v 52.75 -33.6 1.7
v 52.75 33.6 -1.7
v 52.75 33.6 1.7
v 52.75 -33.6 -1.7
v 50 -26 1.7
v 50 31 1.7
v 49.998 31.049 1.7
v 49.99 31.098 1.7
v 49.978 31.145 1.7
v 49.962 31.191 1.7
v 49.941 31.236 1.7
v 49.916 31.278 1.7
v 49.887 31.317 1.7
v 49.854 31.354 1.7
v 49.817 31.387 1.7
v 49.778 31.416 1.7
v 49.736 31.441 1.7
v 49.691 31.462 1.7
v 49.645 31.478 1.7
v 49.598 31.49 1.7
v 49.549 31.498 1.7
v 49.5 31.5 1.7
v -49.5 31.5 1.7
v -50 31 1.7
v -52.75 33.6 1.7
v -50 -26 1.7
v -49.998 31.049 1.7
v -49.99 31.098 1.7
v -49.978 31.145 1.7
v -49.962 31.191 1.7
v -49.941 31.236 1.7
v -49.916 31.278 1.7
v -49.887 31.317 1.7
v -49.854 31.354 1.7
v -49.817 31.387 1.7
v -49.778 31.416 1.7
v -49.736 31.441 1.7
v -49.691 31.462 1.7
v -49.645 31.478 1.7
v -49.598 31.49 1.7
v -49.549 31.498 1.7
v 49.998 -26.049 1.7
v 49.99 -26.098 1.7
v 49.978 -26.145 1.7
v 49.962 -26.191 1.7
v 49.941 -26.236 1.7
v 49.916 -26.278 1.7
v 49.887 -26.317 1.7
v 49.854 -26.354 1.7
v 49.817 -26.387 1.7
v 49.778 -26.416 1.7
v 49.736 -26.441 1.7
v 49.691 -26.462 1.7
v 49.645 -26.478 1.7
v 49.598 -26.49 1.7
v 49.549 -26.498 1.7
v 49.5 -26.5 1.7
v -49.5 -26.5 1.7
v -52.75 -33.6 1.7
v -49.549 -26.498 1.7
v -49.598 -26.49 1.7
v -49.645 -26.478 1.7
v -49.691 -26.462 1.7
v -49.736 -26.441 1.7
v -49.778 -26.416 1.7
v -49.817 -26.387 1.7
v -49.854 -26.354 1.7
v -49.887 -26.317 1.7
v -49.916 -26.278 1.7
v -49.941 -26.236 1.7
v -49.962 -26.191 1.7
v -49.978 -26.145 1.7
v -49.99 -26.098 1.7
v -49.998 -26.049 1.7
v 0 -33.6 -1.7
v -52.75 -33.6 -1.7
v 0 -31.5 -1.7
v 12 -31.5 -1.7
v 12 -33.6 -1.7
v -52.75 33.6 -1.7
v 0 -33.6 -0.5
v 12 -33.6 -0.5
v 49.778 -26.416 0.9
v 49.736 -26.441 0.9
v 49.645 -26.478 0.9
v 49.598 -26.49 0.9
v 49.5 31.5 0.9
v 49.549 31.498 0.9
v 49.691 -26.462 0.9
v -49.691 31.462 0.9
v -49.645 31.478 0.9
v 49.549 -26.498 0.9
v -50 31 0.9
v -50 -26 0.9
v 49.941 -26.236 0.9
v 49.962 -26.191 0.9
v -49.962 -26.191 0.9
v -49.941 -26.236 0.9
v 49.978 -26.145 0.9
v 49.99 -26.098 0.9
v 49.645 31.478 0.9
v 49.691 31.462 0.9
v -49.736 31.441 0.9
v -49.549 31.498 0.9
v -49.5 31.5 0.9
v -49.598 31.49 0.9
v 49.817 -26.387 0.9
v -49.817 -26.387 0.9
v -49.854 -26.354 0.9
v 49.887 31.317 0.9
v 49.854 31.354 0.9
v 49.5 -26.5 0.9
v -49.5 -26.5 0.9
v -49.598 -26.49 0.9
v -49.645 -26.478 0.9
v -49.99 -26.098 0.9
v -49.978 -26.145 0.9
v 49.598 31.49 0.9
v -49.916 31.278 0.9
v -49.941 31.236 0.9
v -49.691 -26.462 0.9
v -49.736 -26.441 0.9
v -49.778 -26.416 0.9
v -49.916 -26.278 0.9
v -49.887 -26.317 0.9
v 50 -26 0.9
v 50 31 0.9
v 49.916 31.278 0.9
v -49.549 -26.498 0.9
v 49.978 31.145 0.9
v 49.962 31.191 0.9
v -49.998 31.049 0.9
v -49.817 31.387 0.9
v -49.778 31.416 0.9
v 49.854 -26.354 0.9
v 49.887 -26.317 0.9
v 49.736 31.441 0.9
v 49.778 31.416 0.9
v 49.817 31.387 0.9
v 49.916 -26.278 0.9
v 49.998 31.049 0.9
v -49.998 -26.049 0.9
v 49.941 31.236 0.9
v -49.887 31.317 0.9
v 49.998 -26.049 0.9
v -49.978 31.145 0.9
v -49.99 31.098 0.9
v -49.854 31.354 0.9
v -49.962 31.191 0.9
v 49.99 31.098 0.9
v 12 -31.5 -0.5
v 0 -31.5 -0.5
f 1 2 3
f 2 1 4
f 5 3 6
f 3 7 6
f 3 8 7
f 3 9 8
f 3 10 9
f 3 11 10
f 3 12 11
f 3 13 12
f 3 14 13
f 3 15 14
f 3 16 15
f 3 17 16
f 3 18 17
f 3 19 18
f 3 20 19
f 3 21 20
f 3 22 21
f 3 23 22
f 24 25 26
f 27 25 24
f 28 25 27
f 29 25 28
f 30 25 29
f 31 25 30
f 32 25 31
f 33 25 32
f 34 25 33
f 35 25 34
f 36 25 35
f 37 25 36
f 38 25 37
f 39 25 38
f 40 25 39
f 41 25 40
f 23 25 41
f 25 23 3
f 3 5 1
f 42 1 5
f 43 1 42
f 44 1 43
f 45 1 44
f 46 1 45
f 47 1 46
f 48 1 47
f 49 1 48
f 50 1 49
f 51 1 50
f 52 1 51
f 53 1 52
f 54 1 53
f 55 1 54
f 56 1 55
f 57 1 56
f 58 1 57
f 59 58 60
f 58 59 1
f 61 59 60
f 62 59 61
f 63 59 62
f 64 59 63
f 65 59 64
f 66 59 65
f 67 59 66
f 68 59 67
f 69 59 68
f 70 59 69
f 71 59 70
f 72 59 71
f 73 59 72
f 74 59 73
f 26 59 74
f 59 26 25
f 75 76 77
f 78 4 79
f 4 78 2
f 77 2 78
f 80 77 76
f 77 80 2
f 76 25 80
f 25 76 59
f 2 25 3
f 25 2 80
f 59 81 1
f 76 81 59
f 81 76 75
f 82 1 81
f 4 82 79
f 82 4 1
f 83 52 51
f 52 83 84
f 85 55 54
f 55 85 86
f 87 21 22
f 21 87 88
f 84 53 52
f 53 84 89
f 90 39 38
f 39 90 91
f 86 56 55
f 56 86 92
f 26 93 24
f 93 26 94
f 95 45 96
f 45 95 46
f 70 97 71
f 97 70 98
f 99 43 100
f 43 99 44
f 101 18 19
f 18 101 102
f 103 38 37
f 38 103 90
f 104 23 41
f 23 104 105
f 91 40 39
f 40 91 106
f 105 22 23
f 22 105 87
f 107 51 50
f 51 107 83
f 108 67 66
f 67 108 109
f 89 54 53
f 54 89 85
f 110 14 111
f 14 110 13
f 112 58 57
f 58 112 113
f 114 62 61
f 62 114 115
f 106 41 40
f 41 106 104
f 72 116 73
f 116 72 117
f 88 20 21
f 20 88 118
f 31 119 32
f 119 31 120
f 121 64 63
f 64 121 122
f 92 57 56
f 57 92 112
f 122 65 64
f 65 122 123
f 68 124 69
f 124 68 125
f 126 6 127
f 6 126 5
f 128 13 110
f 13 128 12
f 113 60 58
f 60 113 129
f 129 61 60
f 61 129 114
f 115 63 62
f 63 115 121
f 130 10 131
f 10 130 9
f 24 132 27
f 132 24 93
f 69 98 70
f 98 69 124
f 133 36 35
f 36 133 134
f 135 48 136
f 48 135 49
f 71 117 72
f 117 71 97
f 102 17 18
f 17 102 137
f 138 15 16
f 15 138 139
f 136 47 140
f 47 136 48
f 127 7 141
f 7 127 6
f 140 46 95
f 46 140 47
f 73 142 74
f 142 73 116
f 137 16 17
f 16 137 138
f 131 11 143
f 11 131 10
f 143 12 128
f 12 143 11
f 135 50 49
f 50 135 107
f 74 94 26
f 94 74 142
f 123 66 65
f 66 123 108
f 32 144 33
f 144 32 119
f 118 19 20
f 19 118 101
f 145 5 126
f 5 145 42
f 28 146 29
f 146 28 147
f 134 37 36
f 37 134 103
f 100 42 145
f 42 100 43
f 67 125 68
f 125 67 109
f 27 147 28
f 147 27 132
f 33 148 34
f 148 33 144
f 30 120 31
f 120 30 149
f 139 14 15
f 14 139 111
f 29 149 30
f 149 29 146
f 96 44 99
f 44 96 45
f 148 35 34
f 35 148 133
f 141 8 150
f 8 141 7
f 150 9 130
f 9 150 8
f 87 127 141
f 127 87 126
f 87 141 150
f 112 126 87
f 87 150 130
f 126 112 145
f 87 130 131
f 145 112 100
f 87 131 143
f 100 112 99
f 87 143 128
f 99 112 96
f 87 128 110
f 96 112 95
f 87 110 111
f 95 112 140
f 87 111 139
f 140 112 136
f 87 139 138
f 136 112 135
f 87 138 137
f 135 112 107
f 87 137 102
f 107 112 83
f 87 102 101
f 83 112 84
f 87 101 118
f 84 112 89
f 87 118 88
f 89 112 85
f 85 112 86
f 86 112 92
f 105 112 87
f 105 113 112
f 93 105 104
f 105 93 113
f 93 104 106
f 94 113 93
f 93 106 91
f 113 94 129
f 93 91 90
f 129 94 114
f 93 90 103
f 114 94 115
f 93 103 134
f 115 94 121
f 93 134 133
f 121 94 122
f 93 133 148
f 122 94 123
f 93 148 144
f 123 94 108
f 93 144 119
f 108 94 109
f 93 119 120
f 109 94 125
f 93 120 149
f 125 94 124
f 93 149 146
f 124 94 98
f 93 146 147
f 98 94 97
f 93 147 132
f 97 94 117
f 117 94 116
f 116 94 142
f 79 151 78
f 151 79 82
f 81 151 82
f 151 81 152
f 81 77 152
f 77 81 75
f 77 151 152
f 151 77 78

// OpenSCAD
$fn = 64;

// LCD display 4.3" (approx) — ONE connected solid with visible front recess + bottom notch
w = 105.5;
h = 67.2;
t = 3.4;

// Front window/recess region (from provided points)
win_p1 = [-50, -26.5];
win_p2 = [ 50,  31.5];
win_corner_r = 0.5;

// Secondary feature near bottom edge (connector/notch) (from provided points)
notch_p1 = [0,  -34.5];
notch_p2 = [12, -31.5];

// Depths
front_recess_depth = 0.8;   // shallow recess from front face
notch_depth        = 1.2;   // notch cut from bottom face upward
eps = 0.02;

module rounded_rect_2d(sz=[10,10], r=1) {
    r2 = min(r, sz[0]/2, sz[1]/2);
    offset(r=r2) offset(delta=-r2) square(sz, center=true);
}

module lcd_module() {
    // Derived window dims/center
    win_w  = win_p2[0] - win_p1[0];
    win_h  = win_p2[1] - win_p1[1];
    win_cx = (win_p1[0] + win_p2[0]) / 2;
    win_cy = (win_p1[1] + win_p2[1]) / 2;

    // Derived notch dims/center (treat given points as opposite corners)
    notch_w  = abs(notch_p2[0] - notch_p1[0]);
    notch_h  = abs(notch_p2[1] - notch_p1[1]);
    notch_cx = (notch_p1[0] + notch_p2[0]) / 2;
    notch_cy = (notch_p1[1] + notch_p2[1]) / 2;

    difference() {
        // Main slab centered at origin (ensures visible geometry)
        cube([w, h, t], center=true);

        // Front window recess: cut into +Z (front) face
        translate([win_cx, win_cy, t/2 - front_recess_depth/2 + eps])
            linear_extrude(height=front_recess_depth + 2*eps, center=true)
                rounded_rect_2d([win_w, win_h], r=win_corner_r);

        // Bottom notch: cut from -Z (bottom) face upward
        translate([notch_cx, notch_cy, -t/2 + notch_depth/2 - eps])
            cube([notch_w, notch_h, notch_depth + 2*eps], center=true);
    }
}

lcd_module();
